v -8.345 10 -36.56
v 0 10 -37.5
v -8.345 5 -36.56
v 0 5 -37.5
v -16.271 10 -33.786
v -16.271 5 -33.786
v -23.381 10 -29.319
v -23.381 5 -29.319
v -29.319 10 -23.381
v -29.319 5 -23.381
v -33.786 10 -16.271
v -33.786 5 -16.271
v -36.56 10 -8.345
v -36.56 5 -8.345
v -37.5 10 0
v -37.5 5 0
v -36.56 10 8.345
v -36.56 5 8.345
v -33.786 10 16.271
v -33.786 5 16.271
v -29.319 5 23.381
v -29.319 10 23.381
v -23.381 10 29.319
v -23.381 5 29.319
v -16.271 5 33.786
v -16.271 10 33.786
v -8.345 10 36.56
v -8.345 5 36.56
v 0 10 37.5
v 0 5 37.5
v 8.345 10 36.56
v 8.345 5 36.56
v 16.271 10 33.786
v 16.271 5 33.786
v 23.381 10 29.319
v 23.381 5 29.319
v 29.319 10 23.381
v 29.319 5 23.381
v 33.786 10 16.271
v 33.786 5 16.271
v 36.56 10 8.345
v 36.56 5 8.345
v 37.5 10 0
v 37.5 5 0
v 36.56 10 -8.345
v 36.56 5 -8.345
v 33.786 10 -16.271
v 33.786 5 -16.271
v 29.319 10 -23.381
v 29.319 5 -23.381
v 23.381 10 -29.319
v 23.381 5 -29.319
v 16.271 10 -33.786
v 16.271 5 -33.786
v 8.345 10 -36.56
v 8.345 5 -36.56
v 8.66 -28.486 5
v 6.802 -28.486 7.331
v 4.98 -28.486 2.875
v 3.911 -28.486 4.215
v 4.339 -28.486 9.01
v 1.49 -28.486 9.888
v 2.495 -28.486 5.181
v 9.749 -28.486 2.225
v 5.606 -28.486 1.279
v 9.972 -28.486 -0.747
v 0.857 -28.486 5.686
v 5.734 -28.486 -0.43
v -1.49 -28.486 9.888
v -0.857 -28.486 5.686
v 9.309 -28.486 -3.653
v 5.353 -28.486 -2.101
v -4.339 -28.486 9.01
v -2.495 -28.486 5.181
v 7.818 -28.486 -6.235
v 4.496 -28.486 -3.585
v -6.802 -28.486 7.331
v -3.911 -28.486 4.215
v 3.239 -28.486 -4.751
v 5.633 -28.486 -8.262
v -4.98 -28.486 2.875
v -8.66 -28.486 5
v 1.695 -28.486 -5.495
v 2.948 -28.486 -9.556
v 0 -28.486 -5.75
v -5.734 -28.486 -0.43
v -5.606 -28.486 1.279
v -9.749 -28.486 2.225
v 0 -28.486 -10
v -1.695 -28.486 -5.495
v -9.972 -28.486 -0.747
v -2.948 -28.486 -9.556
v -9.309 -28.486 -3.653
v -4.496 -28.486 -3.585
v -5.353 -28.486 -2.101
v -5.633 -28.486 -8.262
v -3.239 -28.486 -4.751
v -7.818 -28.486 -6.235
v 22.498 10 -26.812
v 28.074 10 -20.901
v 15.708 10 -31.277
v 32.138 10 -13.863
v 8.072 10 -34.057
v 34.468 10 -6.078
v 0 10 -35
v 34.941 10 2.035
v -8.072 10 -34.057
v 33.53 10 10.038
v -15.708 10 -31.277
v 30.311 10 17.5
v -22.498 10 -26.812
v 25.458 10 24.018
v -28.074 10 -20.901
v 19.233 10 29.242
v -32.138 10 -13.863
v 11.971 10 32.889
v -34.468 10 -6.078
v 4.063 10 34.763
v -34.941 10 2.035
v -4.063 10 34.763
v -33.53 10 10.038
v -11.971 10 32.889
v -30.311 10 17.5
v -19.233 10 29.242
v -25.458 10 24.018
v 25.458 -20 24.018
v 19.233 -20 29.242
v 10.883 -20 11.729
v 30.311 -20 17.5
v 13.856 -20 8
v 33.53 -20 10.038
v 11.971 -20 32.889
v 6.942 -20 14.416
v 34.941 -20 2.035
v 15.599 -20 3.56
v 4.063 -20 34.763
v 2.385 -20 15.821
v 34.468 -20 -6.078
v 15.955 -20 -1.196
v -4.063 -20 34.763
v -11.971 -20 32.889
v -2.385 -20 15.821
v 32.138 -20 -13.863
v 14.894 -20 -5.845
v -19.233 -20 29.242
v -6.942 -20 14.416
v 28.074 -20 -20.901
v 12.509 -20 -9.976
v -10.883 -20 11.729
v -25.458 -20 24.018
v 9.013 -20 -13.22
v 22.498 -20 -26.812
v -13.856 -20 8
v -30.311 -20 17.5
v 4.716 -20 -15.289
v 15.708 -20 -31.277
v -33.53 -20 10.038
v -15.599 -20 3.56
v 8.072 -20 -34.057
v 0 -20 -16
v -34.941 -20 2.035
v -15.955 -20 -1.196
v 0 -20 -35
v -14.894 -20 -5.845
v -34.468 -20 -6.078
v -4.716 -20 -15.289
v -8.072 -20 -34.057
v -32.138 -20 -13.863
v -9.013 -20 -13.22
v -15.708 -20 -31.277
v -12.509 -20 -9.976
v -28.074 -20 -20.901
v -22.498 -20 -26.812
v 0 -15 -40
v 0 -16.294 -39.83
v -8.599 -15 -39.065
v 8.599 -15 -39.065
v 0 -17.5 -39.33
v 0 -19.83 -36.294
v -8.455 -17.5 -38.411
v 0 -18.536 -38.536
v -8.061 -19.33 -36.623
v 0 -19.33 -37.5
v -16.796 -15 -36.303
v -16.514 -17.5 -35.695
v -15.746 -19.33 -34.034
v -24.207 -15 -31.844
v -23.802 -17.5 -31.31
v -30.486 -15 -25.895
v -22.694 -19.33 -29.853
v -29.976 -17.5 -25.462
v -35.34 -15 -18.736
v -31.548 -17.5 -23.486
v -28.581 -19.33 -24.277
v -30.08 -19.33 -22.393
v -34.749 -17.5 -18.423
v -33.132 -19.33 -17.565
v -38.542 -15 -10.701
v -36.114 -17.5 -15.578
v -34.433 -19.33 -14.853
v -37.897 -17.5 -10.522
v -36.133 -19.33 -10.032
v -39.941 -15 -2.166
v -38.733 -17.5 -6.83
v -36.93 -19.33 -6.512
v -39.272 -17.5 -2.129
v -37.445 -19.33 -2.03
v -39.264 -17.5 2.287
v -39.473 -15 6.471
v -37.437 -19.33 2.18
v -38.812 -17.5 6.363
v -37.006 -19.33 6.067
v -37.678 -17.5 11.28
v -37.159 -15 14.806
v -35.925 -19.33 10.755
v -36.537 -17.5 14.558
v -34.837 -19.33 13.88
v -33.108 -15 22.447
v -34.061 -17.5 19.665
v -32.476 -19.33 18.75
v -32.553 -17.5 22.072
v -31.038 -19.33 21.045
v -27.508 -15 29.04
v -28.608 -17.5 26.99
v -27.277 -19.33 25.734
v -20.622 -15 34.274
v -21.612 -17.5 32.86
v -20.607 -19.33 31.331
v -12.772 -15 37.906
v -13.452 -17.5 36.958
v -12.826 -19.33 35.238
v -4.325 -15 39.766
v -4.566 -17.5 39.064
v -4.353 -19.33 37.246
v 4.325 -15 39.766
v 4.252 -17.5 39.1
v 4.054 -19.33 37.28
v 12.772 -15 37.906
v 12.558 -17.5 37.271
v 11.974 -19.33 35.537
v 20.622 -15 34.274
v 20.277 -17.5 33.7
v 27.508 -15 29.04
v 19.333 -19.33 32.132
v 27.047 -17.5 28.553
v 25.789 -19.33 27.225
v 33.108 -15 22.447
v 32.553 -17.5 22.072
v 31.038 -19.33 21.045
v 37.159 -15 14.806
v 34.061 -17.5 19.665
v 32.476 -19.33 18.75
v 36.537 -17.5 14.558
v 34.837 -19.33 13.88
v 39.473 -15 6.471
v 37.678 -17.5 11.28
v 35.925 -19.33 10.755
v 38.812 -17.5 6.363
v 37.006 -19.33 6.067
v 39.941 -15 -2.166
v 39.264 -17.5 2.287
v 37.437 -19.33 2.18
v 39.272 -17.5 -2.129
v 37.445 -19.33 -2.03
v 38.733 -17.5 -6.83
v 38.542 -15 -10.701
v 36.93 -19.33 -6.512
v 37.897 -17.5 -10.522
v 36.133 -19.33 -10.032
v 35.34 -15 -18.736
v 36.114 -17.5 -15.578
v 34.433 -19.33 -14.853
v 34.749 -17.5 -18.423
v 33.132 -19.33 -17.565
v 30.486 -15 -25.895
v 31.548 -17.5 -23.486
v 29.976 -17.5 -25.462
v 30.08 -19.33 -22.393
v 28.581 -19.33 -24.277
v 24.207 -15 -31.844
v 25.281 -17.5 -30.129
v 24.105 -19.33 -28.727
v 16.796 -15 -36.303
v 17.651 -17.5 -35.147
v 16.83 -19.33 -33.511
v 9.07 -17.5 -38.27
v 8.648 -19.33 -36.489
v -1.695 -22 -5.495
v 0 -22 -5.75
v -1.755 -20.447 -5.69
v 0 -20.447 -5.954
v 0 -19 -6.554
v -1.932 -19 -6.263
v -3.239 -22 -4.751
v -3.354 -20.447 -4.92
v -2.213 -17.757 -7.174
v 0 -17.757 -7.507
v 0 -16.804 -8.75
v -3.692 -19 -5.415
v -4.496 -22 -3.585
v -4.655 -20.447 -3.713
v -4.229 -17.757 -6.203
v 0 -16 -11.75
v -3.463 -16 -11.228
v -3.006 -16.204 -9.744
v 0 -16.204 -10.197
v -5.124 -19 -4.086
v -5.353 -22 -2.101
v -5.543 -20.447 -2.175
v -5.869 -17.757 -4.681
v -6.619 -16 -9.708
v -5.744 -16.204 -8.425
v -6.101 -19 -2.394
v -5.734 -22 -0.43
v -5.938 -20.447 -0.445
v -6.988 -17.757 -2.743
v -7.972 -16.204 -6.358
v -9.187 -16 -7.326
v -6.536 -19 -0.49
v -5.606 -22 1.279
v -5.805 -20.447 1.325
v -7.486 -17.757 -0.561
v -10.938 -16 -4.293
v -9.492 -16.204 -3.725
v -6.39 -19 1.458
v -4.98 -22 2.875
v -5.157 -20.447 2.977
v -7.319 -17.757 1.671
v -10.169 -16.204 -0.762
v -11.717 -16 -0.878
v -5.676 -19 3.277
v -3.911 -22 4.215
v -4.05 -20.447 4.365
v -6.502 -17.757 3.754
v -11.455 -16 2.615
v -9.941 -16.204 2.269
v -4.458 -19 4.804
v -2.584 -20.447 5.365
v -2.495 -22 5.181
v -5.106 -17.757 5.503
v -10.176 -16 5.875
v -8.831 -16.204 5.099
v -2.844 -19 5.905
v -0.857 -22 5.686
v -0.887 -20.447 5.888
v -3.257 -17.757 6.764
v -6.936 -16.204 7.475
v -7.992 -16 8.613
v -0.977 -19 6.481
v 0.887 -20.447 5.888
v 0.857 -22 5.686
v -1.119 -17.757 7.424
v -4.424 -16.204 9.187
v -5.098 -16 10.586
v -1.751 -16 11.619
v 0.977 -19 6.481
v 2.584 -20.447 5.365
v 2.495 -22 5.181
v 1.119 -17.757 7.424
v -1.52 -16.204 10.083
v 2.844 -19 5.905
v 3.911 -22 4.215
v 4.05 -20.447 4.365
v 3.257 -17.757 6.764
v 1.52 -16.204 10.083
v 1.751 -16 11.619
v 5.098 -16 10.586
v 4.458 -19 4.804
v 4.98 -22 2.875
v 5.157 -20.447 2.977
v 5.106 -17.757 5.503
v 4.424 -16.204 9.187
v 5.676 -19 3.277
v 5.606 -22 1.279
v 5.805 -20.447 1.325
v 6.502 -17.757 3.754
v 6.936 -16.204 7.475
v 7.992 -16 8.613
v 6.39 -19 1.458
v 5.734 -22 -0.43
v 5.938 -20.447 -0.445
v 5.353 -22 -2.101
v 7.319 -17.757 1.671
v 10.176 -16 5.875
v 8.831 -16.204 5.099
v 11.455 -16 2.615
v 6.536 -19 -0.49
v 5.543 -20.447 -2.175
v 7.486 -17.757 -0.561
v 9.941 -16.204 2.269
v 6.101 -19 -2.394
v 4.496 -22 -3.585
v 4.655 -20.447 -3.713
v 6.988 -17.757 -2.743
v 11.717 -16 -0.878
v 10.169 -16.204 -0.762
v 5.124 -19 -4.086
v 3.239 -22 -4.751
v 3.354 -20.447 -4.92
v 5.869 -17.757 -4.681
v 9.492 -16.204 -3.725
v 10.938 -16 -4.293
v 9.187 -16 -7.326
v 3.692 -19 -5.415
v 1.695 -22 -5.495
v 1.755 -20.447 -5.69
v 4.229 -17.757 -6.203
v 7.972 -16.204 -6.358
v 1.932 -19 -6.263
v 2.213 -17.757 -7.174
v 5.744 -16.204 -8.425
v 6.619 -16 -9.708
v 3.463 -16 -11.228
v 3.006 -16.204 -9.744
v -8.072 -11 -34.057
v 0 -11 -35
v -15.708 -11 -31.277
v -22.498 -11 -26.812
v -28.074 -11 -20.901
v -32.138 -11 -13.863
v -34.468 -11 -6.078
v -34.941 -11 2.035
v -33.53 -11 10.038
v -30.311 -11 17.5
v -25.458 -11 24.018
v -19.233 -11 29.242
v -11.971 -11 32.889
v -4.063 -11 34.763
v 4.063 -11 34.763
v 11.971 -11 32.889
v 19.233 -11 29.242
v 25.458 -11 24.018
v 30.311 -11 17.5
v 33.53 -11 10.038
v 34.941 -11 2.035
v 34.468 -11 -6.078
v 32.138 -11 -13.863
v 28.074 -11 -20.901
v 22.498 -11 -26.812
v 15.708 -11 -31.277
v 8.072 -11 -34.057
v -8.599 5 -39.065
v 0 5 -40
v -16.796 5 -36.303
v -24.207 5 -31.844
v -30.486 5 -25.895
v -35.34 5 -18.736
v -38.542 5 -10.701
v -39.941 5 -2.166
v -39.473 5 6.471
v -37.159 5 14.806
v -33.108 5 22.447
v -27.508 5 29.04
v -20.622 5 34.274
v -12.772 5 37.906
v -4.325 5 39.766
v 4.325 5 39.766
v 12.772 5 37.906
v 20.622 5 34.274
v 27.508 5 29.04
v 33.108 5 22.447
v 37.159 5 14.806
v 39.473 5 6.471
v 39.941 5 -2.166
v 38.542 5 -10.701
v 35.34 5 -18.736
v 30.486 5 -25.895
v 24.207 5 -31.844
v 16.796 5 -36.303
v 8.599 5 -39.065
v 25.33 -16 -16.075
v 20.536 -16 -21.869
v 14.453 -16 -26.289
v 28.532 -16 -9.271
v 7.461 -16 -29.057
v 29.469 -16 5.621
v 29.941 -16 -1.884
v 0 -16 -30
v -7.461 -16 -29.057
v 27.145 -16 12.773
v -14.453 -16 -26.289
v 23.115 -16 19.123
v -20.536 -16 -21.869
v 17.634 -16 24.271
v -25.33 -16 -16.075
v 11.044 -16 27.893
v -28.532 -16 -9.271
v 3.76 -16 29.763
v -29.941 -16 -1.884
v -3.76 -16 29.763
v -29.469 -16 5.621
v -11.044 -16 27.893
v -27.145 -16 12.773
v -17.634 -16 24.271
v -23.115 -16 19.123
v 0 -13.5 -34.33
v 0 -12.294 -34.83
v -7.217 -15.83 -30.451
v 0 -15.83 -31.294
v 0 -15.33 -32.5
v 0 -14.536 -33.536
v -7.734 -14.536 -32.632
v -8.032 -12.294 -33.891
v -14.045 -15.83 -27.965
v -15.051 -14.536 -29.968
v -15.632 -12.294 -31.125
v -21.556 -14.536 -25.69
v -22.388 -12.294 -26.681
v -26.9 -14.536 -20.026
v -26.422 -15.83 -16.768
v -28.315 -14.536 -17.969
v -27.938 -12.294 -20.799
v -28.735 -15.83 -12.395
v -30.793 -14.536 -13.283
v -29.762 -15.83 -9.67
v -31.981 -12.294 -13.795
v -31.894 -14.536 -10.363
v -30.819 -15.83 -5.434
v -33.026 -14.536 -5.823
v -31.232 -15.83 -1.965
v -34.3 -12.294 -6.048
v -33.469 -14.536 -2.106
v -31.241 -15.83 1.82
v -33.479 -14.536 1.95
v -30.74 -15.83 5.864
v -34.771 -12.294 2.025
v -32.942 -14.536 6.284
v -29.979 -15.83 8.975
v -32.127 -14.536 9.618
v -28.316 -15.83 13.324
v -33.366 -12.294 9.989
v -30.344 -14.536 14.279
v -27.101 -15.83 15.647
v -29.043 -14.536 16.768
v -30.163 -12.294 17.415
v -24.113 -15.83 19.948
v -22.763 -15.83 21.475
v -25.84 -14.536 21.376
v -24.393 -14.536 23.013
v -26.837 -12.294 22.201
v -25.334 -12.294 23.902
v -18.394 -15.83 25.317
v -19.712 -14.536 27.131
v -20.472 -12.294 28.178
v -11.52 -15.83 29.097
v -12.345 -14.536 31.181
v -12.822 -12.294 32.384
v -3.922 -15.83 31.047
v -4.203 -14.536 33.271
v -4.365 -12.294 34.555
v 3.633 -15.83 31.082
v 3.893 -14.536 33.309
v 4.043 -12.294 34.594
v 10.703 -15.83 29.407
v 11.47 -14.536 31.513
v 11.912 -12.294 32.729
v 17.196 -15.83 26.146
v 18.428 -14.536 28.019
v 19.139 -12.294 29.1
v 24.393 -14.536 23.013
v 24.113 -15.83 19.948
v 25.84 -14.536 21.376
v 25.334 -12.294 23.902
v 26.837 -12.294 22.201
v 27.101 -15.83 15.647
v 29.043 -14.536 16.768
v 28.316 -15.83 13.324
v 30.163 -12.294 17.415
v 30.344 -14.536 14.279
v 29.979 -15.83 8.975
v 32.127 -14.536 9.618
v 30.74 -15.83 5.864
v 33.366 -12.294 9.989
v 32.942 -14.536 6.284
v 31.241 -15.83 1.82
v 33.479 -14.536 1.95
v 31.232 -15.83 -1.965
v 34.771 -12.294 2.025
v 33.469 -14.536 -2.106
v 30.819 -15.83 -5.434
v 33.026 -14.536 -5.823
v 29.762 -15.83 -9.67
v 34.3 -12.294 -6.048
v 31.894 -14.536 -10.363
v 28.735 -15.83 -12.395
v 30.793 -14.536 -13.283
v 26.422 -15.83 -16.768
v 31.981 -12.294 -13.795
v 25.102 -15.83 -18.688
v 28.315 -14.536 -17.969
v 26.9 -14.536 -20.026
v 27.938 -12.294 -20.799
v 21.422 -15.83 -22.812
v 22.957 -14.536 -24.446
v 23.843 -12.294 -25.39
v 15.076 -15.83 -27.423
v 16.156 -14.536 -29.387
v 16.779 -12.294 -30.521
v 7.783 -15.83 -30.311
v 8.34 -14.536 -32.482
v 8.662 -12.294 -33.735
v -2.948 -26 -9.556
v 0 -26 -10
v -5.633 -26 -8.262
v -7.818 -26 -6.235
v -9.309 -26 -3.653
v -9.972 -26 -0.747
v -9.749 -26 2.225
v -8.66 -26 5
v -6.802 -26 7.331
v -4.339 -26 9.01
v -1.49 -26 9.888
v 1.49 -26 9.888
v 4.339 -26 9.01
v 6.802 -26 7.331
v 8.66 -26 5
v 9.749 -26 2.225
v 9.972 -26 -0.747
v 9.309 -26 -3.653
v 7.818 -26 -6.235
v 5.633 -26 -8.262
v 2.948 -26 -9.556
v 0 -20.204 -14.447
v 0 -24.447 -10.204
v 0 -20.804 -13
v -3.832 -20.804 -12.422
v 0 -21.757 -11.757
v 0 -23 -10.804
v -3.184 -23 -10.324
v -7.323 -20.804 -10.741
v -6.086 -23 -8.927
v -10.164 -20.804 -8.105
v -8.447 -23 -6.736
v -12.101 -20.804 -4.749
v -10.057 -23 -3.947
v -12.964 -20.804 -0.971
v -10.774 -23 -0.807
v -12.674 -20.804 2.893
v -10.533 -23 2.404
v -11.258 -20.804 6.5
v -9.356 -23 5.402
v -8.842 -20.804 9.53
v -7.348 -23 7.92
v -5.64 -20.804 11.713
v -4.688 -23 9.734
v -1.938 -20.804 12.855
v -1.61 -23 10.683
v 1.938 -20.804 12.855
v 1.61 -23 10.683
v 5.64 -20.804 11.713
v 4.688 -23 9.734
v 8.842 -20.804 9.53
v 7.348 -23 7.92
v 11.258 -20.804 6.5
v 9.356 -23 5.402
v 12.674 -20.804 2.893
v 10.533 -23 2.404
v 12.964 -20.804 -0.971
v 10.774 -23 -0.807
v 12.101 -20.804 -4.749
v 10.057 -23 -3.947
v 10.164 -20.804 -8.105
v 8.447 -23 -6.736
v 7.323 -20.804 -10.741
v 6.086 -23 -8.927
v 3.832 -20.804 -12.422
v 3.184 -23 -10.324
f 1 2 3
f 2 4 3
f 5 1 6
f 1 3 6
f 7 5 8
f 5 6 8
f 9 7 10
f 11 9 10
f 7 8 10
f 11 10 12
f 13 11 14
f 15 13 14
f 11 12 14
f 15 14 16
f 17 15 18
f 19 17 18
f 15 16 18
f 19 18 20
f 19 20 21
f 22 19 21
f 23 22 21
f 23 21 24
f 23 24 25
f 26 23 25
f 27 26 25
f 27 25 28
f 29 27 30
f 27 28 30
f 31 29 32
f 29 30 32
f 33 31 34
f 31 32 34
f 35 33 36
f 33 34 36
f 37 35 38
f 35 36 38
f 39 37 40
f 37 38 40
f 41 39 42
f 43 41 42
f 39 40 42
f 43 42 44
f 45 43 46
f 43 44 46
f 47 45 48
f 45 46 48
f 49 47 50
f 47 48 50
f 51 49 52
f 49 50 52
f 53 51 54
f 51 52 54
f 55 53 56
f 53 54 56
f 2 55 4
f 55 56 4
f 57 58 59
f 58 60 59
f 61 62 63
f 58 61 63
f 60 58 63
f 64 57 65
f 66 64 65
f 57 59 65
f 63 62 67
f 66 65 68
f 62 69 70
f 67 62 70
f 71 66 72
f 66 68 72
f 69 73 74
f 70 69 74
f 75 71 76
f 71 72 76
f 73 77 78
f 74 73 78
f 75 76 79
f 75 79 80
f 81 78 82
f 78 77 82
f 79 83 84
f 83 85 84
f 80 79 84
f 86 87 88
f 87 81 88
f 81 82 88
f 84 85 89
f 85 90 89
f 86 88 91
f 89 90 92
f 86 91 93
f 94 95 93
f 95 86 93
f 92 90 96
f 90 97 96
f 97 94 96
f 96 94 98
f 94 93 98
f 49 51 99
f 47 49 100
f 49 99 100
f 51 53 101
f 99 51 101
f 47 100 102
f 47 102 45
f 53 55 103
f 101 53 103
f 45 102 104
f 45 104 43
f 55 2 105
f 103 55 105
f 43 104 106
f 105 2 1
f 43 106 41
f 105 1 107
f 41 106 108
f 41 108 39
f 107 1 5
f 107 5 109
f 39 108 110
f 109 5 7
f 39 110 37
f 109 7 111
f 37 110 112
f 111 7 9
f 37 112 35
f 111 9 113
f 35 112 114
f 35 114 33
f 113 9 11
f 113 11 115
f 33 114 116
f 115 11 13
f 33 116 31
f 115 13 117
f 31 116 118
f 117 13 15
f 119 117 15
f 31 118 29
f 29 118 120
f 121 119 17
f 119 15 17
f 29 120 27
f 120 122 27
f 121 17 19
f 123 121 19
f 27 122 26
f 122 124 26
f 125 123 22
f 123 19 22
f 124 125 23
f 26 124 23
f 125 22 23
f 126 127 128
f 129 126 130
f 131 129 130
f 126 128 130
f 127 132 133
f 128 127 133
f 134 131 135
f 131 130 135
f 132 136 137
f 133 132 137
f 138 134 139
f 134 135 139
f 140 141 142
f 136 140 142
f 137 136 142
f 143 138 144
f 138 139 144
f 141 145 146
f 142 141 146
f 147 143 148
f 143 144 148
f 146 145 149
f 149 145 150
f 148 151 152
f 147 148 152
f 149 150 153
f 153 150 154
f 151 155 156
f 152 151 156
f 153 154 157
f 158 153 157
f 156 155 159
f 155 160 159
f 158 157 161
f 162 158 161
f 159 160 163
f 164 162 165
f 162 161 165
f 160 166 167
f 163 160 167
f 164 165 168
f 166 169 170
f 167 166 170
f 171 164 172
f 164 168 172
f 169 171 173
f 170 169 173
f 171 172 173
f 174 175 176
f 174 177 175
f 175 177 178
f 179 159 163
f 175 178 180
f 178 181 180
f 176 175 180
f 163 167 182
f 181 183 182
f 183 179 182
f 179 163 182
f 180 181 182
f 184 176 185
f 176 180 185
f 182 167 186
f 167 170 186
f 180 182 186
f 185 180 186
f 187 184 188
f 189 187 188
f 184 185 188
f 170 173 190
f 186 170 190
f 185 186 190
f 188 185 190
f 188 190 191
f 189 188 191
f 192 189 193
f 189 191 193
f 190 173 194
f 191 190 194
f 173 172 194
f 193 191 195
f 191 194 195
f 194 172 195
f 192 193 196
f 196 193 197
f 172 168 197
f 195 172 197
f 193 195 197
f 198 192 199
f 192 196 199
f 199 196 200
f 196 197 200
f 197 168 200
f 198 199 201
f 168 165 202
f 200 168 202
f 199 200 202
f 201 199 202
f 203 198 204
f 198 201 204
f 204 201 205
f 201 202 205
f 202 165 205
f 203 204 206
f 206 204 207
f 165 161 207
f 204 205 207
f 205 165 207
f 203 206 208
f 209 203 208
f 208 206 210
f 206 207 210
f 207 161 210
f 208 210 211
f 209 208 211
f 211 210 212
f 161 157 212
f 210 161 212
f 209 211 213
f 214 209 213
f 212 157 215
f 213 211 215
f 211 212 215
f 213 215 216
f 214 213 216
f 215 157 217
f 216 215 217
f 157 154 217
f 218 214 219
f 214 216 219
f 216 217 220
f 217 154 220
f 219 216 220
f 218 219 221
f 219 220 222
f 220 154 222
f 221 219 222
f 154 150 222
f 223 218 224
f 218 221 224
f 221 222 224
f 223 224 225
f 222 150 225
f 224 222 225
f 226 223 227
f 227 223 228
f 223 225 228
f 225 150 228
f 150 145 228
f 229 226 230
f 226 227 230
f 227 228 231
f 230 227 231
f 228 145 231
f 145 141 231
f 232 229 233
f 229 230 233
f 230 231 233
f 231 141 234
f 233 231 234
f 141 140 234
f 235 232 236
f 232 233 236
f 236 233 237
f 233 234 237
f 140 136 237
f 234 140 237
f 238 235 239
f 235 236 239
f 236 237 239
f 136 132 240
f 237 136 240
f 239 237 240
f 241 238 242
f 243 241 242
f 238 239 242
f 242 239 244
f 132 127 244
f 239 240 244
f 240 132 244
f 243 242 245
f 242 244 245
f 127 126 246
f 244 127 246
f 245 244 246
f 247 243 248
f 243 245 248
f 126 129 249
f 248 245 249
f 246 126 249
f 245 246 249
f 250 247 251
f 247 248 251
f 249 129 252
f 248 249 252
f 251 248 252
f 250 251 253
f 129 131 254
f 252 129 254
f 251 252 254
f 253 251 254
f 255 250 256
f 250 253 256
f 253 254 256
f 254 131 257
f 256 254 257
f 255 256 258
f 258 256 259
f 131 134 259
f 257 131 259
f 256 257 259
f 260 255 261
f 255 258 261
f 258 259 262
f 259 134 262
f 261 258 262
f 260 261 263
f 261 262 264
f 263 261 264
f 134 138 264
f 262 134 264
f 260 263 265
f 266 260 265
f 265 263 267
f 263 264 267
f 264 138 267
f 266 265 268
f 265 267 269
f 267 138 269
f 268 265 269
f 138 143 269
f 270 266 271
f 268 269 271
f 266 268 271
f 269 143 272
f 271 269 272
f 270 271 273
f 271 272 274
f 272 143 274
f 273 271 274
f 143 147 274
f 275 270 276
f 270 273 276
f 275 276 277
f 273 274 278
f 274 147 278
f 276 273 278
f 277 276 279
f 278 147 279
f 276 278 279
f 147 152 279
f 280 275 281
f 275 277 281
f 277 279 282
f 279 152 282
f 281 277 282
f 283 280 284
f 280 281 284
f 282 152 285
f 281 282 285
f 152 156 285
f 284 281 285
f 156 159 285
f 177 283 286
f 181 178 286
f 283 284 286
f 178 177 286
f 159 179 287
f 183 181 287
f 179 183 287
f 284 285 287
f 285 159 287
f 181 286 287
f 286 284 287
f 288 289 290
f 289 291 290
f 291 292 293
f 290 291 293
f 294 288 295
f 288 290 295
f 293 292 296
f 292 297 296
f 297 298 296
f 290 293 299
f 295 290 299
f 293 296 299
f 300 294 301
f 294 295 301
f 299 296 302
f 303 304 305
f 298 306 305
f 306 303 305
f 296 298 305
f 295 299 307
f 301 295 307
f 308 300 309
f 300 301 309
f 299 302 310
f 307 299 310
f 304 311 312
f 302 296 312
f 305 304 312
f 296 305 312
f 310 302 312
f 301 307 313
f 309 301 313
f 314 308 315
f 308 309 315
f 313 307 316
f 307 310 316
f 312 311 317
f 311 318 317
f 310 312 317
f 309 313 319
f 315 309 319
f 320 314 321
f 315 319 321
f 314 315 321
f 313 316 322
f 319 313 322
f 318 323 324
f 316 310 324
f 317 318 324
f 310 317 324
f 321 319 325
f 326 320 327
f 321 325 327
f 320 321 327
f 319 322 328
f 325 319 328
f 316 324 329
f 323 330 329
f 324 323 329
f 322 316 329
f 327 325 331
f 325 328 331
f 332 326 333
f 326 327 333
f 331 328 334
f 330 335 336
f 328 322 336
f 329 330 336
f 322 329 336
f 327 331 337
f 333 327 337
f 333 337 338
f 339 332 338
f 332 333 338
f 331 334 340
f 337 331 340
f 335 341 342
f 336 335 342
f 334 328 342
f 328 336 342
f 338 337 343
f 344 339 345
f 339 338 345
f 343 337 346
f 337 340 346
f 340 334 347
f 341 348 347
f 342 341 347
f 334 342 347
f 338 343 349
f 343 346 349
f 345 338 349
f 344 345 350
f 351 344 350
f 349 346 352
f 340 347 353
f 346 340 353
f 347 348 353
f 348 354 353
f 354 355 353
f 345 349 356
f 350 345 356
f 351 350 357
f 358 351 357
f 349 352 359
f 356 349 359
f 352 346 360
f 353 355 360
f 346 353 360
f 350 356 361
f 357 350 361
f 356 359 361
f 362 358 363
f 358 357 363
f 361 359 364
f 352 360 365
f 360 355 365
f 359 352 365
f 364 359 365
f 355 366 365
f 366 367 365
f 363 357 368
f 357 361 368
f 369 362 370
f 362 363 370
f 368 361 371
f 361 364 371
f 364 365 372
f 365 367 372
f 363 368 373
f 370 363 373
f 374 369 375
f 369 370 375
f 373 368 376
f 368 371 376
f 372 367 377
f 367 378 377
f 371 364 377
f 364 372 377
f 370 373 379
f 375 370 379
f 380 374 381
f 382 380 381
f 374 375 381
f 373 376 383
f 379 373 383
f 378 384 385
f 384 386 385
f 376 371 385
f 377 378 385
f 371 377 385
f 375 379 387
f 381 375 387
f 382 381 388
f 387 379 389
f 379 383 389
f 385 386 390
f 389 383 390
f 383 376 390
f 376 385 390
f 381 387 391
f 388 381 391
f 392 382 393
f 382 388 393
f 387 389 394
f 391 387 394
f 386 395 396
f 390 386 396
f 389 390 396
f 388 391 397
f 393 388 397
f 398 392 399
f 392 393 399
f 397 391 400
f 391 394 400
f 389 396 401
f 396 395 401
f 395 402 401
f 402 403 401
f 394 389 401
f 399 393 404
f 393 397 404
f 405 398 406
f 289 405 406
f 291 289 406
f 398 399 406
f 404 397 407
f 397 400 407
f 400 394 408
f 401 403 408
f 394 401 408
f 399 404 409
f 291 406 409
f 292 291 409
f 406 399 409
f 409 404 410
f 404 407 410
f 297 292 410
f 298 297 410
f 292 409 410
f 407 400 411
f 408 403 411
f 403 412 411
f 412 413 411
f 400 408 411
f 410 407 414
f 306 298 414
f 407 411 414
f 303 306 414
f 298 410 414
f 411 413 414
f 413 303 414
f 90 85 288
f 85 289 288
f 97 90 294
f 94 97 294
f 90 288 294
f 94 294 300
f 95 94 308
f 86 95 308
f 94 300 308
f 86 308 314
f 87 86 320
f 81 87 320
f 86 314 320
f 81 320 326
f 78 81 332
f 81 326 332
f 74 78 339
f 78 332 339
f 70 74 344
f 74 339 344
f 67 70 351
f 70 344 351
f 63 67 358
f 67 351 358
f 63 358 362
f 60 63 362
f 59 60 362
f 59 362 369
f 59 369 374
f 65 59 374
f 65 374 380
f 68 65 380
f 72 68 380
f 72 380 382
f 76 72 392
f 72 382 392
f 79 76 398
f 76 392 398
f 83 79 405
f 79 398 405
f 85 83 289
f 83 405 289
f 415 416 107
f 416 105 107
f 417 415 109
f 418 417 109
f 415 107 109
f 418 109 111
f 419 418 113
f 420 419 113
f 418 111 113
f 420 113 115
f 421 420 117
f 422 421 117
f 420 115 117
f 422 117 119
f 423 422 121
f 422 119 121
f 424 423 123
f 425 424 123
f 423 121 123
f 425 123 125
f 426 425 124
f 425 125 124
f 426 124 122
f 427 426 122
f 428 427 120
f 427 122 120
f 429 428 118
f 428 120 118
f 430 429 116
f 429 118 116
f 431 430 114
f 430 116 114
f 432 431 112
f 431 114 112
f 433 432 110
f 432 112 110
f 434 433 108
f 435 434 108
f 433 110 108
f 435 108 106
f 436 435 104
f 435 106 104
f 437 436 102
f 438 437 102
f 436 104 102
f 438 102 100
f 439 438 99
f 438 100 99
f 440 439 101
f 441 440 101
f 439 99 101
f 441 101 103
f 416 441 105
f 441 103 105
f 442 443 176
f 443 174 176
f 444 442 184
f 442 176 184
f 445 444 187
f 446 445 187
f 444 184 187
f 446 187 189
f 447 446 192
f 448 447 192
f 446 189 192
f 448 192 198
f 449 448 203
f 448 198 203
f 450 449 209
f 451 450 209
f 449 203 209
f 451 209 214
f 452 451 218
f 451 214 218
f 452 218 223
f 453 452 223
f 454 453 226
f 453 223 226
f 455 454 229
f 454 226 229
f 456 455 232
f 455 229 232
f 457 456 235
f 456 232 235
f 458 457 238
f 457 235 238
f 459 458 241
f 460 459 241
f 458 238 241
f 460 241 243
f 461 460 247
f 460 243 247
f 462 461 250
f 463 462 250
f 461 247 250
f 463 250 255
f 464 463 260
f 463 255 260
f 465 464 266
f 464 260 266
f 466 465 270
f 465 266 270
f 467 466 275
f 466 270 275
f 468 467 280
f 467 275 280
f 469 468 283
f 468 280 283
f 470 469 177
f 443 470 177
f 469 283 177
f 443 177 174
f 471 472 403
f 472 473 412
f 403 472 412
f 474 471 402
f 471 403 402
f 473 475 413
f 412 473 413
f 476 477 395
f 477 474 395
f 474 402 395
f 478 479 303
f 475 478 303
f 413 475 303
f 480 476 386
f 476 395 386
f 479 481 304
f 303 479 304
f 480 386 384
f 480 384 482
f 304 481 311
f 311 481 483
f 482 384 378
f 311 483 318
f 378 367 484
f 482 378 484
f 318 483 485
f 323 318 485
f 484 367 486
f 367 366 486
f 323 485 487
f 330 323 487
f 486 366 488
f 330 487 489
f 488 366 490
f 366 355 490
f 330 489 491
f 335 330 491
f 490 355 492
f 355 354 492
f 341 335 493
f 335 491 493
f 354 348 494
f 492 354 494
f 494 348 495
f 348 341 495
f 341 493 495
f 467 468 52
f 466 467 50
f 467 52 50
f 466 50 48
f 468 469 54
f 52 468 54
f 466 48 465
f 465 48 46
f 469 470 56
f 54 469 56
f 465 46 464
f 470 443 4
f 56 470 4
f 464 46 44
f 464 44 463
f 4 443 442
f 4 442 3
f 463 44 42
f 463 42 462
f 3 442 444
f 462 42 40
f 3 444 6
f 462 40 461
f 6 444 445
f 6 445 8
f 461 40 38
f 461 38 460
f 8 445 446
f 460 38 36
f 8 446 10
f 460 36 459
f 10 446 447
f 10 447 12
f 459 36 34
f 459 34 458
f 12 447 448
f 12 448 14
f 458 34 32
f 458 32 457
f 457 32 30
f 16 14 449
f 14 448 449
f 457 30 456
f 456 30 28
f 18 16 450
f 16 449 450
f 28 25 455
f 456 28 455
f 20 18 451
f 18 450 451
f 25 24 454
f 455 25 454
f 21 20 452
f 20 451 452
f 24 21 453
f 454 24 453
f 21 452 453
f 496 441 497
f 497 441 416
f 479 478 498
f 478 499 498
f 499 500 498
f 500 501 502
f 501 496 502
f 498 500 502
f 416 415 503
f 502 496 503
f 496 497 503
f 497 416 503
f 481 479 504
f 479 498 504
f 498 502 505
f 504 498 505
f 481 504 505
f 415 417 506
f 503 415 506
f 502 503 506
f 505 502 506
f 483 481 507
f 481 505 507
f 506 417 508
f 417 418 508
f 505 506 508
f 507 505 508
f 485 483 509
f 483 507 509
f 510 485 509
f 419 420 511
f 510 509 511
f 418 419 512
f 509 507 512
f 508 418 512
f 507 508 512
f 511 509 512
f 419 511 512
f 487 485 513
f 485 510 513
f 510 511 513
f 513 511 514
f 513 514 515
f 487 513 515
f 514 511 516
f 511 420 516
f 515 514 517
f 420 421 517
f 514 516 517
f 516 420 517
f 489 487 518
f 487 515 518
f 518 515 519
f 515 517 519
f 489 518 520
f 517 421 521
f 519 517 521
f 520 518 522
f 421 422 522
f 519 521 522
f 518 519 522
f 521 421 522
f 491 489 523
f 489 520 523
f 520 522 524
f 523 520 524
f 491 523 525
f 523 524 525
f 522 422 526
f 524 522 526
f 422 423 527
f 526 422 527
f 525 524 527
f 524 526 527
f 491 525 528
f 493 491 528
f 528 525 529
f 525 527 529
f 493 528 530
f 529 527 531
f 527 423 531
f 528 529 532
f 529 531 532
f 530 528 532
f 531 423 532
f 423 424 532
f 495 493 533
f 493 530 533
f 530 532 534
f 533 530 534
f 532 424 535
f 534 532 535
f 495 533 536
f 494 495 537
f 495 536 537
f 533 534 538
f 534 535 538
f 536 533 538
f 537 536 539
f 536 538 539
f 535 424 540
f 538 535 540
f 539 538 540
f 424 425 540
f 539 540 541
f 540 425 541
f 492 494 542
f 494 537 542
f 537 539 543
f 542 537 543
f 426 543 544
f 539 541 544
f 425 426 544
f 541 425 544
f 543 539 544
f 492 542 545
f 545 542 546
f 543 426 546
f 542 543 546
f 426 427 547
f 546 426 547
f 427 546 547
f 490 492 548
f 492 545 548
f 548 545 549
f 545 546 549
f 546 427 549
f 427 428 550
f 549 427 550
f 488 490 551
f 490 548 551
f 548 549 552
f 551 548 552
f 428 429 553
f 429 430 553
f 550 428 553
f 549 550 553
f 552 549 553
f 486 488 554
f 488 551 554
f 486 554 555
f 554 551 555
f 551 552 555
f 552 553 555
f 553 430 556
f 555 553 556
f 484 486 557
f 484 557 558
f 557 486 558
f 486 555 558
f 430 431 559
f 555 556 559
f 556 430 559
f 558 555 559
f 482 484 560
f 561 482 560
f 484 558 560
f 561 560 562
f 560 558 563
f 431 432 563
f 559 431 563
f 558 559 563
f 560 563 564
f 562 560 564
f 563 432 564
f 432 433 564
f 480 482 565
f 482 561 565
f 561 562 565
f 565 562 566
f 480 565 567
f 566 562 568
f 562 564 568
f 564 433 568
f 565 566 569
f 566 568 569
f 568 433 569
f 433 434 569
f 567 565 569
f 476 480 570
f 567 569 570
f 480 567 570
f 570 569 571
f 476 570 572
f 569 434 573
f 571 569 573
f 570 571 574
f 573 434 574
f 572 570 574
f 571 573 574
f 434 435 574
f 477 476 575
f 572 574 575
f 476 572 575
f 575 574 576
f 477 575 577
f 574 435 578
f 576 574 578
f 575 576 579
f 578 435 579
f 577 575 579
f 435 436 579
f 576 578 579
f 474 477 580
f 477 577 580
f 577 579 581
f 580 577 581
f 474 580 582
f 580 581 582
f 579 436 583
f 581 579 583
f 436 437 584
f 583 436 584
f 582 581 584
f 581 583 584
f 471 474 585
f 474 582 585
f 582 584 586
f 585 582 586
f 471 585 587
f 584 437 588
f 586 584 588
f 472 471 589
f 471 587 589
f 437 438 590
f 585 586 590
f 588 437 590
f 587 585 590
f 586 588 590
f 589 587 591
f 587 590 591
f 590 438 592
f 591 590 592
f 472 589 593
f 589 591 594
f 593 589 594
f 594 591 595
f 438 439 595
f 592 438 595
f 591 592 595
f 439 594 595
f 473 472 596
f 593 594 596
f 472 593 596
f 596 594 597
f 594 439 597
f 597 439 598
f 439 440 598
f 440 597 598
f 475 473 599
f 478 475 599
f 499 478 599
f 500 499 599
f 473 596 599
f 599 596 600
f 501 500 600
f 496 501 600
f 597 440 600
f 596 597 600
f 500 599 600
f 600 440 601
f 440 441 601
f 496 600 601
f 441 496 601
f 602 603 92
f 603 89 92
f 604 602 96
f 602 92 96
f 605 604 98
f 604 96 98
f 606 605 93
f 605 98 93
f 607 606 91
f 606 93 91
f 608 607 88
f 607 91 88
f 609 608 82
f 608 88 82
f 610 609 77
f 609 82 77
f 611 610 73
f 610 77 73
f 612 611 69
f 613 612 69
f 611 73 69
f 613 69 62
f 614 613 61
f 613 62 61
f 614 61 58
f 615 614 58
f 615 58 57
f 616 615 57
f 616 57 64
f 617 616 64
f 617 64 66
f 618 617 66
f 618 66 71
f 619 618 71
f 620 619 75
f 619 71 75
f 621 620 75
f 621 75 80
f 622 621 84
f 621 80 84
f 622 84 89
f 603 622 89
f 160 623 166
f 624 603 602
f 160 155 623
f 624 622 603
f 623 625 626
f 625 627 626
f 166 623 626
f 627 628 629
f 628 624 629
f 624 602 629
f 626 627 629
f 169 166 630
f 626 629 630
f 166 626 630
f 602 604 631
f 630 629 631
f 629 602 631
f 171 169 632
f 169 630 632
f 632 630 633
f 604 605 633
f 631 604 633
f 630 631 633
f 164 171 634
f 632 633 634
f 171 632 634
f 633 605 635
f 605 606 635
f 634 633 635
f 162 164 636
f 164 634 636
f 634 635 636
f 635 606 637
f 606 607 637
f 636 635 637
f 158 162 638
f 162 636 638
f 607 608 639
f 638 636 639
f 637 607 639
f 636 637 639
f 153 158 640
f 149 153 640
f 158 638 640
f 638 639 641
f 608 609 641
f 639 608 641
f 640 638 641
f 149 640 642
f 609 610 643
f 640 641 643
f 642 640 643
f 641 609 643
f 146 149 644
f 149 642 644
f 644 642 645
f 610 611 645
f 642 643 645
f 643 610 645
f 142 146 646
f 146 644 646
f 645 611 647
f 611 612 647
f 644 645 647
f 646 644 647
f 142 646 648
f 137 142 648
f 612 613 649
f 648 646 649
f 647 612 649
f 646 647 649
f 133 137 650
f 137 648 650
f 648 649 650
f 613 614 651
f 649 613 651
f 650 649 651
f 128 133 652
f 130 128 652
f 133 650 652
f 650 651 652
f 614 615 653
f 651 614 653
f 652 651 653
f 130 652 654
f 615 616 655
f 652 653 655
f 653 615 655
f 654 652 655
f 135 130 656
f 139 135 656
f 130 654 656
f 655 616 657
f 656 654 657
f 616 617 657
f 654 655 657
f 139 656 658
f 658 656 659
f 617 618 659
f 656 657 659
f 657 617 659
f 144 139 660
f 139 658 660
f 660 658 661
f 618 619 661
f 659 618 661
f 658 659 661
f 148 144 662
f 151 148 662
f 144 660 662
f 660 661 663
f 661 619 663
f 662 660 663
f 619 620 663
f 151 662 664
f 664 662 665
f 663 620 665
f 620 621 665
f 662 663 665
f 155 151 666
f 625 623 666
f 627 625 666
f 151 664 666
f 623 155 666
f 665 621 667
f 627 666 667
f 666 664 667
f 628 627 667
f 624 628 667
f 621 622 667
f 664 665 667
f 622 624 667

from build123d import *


with BuildPart() as part:
    # Sketch1 → Revolve1 (revolve)
    with BuildSketch(Plane.XY, mode=Mode.PRIVATE) as revolve1_sk:
        with BuildLine():
            Line((-40, 5), (-40, -15))
            ThreePointArc((-40, -15), (-38.535533906, -18.535533906), (-35, -20))
            Line((-35, -20), (-16, -20))
            ThreePointArc((-16, -20), (-11.757359313, -21.757359313), (-10, -26))
            Line((-10, -26), (-10, -28.486287513))
            Line((-10, -28.486287513), (-5.75, -28.486287513))
            Line((-5.75, -28.486287513), (-5.75, -22))
            ThreePointArc((-5.75, -22), (-7.507359313, -17.757359313), (-11.75, -16))
            Line((-11.75, -16), (-30, -16))
            ThreePointArc((-30, -16), (-33.535533906, -14.535533906), (-35, -11))
            Line((-35, -11), (-35, 10))
            Line((-35, 10), (-37.5, 10))
            Line((-37.5, 10), (-37.5, 5))
            Line((-37.5, 5), (-40, 5))
        make_face()
    revolve(revolve1_sk.sketch.rotate(Axis((0, 0, 0), (0, 1, 0)), 270), axis=Axis((0, 0, 0), (0, 1, 0)))


solid = part.part
